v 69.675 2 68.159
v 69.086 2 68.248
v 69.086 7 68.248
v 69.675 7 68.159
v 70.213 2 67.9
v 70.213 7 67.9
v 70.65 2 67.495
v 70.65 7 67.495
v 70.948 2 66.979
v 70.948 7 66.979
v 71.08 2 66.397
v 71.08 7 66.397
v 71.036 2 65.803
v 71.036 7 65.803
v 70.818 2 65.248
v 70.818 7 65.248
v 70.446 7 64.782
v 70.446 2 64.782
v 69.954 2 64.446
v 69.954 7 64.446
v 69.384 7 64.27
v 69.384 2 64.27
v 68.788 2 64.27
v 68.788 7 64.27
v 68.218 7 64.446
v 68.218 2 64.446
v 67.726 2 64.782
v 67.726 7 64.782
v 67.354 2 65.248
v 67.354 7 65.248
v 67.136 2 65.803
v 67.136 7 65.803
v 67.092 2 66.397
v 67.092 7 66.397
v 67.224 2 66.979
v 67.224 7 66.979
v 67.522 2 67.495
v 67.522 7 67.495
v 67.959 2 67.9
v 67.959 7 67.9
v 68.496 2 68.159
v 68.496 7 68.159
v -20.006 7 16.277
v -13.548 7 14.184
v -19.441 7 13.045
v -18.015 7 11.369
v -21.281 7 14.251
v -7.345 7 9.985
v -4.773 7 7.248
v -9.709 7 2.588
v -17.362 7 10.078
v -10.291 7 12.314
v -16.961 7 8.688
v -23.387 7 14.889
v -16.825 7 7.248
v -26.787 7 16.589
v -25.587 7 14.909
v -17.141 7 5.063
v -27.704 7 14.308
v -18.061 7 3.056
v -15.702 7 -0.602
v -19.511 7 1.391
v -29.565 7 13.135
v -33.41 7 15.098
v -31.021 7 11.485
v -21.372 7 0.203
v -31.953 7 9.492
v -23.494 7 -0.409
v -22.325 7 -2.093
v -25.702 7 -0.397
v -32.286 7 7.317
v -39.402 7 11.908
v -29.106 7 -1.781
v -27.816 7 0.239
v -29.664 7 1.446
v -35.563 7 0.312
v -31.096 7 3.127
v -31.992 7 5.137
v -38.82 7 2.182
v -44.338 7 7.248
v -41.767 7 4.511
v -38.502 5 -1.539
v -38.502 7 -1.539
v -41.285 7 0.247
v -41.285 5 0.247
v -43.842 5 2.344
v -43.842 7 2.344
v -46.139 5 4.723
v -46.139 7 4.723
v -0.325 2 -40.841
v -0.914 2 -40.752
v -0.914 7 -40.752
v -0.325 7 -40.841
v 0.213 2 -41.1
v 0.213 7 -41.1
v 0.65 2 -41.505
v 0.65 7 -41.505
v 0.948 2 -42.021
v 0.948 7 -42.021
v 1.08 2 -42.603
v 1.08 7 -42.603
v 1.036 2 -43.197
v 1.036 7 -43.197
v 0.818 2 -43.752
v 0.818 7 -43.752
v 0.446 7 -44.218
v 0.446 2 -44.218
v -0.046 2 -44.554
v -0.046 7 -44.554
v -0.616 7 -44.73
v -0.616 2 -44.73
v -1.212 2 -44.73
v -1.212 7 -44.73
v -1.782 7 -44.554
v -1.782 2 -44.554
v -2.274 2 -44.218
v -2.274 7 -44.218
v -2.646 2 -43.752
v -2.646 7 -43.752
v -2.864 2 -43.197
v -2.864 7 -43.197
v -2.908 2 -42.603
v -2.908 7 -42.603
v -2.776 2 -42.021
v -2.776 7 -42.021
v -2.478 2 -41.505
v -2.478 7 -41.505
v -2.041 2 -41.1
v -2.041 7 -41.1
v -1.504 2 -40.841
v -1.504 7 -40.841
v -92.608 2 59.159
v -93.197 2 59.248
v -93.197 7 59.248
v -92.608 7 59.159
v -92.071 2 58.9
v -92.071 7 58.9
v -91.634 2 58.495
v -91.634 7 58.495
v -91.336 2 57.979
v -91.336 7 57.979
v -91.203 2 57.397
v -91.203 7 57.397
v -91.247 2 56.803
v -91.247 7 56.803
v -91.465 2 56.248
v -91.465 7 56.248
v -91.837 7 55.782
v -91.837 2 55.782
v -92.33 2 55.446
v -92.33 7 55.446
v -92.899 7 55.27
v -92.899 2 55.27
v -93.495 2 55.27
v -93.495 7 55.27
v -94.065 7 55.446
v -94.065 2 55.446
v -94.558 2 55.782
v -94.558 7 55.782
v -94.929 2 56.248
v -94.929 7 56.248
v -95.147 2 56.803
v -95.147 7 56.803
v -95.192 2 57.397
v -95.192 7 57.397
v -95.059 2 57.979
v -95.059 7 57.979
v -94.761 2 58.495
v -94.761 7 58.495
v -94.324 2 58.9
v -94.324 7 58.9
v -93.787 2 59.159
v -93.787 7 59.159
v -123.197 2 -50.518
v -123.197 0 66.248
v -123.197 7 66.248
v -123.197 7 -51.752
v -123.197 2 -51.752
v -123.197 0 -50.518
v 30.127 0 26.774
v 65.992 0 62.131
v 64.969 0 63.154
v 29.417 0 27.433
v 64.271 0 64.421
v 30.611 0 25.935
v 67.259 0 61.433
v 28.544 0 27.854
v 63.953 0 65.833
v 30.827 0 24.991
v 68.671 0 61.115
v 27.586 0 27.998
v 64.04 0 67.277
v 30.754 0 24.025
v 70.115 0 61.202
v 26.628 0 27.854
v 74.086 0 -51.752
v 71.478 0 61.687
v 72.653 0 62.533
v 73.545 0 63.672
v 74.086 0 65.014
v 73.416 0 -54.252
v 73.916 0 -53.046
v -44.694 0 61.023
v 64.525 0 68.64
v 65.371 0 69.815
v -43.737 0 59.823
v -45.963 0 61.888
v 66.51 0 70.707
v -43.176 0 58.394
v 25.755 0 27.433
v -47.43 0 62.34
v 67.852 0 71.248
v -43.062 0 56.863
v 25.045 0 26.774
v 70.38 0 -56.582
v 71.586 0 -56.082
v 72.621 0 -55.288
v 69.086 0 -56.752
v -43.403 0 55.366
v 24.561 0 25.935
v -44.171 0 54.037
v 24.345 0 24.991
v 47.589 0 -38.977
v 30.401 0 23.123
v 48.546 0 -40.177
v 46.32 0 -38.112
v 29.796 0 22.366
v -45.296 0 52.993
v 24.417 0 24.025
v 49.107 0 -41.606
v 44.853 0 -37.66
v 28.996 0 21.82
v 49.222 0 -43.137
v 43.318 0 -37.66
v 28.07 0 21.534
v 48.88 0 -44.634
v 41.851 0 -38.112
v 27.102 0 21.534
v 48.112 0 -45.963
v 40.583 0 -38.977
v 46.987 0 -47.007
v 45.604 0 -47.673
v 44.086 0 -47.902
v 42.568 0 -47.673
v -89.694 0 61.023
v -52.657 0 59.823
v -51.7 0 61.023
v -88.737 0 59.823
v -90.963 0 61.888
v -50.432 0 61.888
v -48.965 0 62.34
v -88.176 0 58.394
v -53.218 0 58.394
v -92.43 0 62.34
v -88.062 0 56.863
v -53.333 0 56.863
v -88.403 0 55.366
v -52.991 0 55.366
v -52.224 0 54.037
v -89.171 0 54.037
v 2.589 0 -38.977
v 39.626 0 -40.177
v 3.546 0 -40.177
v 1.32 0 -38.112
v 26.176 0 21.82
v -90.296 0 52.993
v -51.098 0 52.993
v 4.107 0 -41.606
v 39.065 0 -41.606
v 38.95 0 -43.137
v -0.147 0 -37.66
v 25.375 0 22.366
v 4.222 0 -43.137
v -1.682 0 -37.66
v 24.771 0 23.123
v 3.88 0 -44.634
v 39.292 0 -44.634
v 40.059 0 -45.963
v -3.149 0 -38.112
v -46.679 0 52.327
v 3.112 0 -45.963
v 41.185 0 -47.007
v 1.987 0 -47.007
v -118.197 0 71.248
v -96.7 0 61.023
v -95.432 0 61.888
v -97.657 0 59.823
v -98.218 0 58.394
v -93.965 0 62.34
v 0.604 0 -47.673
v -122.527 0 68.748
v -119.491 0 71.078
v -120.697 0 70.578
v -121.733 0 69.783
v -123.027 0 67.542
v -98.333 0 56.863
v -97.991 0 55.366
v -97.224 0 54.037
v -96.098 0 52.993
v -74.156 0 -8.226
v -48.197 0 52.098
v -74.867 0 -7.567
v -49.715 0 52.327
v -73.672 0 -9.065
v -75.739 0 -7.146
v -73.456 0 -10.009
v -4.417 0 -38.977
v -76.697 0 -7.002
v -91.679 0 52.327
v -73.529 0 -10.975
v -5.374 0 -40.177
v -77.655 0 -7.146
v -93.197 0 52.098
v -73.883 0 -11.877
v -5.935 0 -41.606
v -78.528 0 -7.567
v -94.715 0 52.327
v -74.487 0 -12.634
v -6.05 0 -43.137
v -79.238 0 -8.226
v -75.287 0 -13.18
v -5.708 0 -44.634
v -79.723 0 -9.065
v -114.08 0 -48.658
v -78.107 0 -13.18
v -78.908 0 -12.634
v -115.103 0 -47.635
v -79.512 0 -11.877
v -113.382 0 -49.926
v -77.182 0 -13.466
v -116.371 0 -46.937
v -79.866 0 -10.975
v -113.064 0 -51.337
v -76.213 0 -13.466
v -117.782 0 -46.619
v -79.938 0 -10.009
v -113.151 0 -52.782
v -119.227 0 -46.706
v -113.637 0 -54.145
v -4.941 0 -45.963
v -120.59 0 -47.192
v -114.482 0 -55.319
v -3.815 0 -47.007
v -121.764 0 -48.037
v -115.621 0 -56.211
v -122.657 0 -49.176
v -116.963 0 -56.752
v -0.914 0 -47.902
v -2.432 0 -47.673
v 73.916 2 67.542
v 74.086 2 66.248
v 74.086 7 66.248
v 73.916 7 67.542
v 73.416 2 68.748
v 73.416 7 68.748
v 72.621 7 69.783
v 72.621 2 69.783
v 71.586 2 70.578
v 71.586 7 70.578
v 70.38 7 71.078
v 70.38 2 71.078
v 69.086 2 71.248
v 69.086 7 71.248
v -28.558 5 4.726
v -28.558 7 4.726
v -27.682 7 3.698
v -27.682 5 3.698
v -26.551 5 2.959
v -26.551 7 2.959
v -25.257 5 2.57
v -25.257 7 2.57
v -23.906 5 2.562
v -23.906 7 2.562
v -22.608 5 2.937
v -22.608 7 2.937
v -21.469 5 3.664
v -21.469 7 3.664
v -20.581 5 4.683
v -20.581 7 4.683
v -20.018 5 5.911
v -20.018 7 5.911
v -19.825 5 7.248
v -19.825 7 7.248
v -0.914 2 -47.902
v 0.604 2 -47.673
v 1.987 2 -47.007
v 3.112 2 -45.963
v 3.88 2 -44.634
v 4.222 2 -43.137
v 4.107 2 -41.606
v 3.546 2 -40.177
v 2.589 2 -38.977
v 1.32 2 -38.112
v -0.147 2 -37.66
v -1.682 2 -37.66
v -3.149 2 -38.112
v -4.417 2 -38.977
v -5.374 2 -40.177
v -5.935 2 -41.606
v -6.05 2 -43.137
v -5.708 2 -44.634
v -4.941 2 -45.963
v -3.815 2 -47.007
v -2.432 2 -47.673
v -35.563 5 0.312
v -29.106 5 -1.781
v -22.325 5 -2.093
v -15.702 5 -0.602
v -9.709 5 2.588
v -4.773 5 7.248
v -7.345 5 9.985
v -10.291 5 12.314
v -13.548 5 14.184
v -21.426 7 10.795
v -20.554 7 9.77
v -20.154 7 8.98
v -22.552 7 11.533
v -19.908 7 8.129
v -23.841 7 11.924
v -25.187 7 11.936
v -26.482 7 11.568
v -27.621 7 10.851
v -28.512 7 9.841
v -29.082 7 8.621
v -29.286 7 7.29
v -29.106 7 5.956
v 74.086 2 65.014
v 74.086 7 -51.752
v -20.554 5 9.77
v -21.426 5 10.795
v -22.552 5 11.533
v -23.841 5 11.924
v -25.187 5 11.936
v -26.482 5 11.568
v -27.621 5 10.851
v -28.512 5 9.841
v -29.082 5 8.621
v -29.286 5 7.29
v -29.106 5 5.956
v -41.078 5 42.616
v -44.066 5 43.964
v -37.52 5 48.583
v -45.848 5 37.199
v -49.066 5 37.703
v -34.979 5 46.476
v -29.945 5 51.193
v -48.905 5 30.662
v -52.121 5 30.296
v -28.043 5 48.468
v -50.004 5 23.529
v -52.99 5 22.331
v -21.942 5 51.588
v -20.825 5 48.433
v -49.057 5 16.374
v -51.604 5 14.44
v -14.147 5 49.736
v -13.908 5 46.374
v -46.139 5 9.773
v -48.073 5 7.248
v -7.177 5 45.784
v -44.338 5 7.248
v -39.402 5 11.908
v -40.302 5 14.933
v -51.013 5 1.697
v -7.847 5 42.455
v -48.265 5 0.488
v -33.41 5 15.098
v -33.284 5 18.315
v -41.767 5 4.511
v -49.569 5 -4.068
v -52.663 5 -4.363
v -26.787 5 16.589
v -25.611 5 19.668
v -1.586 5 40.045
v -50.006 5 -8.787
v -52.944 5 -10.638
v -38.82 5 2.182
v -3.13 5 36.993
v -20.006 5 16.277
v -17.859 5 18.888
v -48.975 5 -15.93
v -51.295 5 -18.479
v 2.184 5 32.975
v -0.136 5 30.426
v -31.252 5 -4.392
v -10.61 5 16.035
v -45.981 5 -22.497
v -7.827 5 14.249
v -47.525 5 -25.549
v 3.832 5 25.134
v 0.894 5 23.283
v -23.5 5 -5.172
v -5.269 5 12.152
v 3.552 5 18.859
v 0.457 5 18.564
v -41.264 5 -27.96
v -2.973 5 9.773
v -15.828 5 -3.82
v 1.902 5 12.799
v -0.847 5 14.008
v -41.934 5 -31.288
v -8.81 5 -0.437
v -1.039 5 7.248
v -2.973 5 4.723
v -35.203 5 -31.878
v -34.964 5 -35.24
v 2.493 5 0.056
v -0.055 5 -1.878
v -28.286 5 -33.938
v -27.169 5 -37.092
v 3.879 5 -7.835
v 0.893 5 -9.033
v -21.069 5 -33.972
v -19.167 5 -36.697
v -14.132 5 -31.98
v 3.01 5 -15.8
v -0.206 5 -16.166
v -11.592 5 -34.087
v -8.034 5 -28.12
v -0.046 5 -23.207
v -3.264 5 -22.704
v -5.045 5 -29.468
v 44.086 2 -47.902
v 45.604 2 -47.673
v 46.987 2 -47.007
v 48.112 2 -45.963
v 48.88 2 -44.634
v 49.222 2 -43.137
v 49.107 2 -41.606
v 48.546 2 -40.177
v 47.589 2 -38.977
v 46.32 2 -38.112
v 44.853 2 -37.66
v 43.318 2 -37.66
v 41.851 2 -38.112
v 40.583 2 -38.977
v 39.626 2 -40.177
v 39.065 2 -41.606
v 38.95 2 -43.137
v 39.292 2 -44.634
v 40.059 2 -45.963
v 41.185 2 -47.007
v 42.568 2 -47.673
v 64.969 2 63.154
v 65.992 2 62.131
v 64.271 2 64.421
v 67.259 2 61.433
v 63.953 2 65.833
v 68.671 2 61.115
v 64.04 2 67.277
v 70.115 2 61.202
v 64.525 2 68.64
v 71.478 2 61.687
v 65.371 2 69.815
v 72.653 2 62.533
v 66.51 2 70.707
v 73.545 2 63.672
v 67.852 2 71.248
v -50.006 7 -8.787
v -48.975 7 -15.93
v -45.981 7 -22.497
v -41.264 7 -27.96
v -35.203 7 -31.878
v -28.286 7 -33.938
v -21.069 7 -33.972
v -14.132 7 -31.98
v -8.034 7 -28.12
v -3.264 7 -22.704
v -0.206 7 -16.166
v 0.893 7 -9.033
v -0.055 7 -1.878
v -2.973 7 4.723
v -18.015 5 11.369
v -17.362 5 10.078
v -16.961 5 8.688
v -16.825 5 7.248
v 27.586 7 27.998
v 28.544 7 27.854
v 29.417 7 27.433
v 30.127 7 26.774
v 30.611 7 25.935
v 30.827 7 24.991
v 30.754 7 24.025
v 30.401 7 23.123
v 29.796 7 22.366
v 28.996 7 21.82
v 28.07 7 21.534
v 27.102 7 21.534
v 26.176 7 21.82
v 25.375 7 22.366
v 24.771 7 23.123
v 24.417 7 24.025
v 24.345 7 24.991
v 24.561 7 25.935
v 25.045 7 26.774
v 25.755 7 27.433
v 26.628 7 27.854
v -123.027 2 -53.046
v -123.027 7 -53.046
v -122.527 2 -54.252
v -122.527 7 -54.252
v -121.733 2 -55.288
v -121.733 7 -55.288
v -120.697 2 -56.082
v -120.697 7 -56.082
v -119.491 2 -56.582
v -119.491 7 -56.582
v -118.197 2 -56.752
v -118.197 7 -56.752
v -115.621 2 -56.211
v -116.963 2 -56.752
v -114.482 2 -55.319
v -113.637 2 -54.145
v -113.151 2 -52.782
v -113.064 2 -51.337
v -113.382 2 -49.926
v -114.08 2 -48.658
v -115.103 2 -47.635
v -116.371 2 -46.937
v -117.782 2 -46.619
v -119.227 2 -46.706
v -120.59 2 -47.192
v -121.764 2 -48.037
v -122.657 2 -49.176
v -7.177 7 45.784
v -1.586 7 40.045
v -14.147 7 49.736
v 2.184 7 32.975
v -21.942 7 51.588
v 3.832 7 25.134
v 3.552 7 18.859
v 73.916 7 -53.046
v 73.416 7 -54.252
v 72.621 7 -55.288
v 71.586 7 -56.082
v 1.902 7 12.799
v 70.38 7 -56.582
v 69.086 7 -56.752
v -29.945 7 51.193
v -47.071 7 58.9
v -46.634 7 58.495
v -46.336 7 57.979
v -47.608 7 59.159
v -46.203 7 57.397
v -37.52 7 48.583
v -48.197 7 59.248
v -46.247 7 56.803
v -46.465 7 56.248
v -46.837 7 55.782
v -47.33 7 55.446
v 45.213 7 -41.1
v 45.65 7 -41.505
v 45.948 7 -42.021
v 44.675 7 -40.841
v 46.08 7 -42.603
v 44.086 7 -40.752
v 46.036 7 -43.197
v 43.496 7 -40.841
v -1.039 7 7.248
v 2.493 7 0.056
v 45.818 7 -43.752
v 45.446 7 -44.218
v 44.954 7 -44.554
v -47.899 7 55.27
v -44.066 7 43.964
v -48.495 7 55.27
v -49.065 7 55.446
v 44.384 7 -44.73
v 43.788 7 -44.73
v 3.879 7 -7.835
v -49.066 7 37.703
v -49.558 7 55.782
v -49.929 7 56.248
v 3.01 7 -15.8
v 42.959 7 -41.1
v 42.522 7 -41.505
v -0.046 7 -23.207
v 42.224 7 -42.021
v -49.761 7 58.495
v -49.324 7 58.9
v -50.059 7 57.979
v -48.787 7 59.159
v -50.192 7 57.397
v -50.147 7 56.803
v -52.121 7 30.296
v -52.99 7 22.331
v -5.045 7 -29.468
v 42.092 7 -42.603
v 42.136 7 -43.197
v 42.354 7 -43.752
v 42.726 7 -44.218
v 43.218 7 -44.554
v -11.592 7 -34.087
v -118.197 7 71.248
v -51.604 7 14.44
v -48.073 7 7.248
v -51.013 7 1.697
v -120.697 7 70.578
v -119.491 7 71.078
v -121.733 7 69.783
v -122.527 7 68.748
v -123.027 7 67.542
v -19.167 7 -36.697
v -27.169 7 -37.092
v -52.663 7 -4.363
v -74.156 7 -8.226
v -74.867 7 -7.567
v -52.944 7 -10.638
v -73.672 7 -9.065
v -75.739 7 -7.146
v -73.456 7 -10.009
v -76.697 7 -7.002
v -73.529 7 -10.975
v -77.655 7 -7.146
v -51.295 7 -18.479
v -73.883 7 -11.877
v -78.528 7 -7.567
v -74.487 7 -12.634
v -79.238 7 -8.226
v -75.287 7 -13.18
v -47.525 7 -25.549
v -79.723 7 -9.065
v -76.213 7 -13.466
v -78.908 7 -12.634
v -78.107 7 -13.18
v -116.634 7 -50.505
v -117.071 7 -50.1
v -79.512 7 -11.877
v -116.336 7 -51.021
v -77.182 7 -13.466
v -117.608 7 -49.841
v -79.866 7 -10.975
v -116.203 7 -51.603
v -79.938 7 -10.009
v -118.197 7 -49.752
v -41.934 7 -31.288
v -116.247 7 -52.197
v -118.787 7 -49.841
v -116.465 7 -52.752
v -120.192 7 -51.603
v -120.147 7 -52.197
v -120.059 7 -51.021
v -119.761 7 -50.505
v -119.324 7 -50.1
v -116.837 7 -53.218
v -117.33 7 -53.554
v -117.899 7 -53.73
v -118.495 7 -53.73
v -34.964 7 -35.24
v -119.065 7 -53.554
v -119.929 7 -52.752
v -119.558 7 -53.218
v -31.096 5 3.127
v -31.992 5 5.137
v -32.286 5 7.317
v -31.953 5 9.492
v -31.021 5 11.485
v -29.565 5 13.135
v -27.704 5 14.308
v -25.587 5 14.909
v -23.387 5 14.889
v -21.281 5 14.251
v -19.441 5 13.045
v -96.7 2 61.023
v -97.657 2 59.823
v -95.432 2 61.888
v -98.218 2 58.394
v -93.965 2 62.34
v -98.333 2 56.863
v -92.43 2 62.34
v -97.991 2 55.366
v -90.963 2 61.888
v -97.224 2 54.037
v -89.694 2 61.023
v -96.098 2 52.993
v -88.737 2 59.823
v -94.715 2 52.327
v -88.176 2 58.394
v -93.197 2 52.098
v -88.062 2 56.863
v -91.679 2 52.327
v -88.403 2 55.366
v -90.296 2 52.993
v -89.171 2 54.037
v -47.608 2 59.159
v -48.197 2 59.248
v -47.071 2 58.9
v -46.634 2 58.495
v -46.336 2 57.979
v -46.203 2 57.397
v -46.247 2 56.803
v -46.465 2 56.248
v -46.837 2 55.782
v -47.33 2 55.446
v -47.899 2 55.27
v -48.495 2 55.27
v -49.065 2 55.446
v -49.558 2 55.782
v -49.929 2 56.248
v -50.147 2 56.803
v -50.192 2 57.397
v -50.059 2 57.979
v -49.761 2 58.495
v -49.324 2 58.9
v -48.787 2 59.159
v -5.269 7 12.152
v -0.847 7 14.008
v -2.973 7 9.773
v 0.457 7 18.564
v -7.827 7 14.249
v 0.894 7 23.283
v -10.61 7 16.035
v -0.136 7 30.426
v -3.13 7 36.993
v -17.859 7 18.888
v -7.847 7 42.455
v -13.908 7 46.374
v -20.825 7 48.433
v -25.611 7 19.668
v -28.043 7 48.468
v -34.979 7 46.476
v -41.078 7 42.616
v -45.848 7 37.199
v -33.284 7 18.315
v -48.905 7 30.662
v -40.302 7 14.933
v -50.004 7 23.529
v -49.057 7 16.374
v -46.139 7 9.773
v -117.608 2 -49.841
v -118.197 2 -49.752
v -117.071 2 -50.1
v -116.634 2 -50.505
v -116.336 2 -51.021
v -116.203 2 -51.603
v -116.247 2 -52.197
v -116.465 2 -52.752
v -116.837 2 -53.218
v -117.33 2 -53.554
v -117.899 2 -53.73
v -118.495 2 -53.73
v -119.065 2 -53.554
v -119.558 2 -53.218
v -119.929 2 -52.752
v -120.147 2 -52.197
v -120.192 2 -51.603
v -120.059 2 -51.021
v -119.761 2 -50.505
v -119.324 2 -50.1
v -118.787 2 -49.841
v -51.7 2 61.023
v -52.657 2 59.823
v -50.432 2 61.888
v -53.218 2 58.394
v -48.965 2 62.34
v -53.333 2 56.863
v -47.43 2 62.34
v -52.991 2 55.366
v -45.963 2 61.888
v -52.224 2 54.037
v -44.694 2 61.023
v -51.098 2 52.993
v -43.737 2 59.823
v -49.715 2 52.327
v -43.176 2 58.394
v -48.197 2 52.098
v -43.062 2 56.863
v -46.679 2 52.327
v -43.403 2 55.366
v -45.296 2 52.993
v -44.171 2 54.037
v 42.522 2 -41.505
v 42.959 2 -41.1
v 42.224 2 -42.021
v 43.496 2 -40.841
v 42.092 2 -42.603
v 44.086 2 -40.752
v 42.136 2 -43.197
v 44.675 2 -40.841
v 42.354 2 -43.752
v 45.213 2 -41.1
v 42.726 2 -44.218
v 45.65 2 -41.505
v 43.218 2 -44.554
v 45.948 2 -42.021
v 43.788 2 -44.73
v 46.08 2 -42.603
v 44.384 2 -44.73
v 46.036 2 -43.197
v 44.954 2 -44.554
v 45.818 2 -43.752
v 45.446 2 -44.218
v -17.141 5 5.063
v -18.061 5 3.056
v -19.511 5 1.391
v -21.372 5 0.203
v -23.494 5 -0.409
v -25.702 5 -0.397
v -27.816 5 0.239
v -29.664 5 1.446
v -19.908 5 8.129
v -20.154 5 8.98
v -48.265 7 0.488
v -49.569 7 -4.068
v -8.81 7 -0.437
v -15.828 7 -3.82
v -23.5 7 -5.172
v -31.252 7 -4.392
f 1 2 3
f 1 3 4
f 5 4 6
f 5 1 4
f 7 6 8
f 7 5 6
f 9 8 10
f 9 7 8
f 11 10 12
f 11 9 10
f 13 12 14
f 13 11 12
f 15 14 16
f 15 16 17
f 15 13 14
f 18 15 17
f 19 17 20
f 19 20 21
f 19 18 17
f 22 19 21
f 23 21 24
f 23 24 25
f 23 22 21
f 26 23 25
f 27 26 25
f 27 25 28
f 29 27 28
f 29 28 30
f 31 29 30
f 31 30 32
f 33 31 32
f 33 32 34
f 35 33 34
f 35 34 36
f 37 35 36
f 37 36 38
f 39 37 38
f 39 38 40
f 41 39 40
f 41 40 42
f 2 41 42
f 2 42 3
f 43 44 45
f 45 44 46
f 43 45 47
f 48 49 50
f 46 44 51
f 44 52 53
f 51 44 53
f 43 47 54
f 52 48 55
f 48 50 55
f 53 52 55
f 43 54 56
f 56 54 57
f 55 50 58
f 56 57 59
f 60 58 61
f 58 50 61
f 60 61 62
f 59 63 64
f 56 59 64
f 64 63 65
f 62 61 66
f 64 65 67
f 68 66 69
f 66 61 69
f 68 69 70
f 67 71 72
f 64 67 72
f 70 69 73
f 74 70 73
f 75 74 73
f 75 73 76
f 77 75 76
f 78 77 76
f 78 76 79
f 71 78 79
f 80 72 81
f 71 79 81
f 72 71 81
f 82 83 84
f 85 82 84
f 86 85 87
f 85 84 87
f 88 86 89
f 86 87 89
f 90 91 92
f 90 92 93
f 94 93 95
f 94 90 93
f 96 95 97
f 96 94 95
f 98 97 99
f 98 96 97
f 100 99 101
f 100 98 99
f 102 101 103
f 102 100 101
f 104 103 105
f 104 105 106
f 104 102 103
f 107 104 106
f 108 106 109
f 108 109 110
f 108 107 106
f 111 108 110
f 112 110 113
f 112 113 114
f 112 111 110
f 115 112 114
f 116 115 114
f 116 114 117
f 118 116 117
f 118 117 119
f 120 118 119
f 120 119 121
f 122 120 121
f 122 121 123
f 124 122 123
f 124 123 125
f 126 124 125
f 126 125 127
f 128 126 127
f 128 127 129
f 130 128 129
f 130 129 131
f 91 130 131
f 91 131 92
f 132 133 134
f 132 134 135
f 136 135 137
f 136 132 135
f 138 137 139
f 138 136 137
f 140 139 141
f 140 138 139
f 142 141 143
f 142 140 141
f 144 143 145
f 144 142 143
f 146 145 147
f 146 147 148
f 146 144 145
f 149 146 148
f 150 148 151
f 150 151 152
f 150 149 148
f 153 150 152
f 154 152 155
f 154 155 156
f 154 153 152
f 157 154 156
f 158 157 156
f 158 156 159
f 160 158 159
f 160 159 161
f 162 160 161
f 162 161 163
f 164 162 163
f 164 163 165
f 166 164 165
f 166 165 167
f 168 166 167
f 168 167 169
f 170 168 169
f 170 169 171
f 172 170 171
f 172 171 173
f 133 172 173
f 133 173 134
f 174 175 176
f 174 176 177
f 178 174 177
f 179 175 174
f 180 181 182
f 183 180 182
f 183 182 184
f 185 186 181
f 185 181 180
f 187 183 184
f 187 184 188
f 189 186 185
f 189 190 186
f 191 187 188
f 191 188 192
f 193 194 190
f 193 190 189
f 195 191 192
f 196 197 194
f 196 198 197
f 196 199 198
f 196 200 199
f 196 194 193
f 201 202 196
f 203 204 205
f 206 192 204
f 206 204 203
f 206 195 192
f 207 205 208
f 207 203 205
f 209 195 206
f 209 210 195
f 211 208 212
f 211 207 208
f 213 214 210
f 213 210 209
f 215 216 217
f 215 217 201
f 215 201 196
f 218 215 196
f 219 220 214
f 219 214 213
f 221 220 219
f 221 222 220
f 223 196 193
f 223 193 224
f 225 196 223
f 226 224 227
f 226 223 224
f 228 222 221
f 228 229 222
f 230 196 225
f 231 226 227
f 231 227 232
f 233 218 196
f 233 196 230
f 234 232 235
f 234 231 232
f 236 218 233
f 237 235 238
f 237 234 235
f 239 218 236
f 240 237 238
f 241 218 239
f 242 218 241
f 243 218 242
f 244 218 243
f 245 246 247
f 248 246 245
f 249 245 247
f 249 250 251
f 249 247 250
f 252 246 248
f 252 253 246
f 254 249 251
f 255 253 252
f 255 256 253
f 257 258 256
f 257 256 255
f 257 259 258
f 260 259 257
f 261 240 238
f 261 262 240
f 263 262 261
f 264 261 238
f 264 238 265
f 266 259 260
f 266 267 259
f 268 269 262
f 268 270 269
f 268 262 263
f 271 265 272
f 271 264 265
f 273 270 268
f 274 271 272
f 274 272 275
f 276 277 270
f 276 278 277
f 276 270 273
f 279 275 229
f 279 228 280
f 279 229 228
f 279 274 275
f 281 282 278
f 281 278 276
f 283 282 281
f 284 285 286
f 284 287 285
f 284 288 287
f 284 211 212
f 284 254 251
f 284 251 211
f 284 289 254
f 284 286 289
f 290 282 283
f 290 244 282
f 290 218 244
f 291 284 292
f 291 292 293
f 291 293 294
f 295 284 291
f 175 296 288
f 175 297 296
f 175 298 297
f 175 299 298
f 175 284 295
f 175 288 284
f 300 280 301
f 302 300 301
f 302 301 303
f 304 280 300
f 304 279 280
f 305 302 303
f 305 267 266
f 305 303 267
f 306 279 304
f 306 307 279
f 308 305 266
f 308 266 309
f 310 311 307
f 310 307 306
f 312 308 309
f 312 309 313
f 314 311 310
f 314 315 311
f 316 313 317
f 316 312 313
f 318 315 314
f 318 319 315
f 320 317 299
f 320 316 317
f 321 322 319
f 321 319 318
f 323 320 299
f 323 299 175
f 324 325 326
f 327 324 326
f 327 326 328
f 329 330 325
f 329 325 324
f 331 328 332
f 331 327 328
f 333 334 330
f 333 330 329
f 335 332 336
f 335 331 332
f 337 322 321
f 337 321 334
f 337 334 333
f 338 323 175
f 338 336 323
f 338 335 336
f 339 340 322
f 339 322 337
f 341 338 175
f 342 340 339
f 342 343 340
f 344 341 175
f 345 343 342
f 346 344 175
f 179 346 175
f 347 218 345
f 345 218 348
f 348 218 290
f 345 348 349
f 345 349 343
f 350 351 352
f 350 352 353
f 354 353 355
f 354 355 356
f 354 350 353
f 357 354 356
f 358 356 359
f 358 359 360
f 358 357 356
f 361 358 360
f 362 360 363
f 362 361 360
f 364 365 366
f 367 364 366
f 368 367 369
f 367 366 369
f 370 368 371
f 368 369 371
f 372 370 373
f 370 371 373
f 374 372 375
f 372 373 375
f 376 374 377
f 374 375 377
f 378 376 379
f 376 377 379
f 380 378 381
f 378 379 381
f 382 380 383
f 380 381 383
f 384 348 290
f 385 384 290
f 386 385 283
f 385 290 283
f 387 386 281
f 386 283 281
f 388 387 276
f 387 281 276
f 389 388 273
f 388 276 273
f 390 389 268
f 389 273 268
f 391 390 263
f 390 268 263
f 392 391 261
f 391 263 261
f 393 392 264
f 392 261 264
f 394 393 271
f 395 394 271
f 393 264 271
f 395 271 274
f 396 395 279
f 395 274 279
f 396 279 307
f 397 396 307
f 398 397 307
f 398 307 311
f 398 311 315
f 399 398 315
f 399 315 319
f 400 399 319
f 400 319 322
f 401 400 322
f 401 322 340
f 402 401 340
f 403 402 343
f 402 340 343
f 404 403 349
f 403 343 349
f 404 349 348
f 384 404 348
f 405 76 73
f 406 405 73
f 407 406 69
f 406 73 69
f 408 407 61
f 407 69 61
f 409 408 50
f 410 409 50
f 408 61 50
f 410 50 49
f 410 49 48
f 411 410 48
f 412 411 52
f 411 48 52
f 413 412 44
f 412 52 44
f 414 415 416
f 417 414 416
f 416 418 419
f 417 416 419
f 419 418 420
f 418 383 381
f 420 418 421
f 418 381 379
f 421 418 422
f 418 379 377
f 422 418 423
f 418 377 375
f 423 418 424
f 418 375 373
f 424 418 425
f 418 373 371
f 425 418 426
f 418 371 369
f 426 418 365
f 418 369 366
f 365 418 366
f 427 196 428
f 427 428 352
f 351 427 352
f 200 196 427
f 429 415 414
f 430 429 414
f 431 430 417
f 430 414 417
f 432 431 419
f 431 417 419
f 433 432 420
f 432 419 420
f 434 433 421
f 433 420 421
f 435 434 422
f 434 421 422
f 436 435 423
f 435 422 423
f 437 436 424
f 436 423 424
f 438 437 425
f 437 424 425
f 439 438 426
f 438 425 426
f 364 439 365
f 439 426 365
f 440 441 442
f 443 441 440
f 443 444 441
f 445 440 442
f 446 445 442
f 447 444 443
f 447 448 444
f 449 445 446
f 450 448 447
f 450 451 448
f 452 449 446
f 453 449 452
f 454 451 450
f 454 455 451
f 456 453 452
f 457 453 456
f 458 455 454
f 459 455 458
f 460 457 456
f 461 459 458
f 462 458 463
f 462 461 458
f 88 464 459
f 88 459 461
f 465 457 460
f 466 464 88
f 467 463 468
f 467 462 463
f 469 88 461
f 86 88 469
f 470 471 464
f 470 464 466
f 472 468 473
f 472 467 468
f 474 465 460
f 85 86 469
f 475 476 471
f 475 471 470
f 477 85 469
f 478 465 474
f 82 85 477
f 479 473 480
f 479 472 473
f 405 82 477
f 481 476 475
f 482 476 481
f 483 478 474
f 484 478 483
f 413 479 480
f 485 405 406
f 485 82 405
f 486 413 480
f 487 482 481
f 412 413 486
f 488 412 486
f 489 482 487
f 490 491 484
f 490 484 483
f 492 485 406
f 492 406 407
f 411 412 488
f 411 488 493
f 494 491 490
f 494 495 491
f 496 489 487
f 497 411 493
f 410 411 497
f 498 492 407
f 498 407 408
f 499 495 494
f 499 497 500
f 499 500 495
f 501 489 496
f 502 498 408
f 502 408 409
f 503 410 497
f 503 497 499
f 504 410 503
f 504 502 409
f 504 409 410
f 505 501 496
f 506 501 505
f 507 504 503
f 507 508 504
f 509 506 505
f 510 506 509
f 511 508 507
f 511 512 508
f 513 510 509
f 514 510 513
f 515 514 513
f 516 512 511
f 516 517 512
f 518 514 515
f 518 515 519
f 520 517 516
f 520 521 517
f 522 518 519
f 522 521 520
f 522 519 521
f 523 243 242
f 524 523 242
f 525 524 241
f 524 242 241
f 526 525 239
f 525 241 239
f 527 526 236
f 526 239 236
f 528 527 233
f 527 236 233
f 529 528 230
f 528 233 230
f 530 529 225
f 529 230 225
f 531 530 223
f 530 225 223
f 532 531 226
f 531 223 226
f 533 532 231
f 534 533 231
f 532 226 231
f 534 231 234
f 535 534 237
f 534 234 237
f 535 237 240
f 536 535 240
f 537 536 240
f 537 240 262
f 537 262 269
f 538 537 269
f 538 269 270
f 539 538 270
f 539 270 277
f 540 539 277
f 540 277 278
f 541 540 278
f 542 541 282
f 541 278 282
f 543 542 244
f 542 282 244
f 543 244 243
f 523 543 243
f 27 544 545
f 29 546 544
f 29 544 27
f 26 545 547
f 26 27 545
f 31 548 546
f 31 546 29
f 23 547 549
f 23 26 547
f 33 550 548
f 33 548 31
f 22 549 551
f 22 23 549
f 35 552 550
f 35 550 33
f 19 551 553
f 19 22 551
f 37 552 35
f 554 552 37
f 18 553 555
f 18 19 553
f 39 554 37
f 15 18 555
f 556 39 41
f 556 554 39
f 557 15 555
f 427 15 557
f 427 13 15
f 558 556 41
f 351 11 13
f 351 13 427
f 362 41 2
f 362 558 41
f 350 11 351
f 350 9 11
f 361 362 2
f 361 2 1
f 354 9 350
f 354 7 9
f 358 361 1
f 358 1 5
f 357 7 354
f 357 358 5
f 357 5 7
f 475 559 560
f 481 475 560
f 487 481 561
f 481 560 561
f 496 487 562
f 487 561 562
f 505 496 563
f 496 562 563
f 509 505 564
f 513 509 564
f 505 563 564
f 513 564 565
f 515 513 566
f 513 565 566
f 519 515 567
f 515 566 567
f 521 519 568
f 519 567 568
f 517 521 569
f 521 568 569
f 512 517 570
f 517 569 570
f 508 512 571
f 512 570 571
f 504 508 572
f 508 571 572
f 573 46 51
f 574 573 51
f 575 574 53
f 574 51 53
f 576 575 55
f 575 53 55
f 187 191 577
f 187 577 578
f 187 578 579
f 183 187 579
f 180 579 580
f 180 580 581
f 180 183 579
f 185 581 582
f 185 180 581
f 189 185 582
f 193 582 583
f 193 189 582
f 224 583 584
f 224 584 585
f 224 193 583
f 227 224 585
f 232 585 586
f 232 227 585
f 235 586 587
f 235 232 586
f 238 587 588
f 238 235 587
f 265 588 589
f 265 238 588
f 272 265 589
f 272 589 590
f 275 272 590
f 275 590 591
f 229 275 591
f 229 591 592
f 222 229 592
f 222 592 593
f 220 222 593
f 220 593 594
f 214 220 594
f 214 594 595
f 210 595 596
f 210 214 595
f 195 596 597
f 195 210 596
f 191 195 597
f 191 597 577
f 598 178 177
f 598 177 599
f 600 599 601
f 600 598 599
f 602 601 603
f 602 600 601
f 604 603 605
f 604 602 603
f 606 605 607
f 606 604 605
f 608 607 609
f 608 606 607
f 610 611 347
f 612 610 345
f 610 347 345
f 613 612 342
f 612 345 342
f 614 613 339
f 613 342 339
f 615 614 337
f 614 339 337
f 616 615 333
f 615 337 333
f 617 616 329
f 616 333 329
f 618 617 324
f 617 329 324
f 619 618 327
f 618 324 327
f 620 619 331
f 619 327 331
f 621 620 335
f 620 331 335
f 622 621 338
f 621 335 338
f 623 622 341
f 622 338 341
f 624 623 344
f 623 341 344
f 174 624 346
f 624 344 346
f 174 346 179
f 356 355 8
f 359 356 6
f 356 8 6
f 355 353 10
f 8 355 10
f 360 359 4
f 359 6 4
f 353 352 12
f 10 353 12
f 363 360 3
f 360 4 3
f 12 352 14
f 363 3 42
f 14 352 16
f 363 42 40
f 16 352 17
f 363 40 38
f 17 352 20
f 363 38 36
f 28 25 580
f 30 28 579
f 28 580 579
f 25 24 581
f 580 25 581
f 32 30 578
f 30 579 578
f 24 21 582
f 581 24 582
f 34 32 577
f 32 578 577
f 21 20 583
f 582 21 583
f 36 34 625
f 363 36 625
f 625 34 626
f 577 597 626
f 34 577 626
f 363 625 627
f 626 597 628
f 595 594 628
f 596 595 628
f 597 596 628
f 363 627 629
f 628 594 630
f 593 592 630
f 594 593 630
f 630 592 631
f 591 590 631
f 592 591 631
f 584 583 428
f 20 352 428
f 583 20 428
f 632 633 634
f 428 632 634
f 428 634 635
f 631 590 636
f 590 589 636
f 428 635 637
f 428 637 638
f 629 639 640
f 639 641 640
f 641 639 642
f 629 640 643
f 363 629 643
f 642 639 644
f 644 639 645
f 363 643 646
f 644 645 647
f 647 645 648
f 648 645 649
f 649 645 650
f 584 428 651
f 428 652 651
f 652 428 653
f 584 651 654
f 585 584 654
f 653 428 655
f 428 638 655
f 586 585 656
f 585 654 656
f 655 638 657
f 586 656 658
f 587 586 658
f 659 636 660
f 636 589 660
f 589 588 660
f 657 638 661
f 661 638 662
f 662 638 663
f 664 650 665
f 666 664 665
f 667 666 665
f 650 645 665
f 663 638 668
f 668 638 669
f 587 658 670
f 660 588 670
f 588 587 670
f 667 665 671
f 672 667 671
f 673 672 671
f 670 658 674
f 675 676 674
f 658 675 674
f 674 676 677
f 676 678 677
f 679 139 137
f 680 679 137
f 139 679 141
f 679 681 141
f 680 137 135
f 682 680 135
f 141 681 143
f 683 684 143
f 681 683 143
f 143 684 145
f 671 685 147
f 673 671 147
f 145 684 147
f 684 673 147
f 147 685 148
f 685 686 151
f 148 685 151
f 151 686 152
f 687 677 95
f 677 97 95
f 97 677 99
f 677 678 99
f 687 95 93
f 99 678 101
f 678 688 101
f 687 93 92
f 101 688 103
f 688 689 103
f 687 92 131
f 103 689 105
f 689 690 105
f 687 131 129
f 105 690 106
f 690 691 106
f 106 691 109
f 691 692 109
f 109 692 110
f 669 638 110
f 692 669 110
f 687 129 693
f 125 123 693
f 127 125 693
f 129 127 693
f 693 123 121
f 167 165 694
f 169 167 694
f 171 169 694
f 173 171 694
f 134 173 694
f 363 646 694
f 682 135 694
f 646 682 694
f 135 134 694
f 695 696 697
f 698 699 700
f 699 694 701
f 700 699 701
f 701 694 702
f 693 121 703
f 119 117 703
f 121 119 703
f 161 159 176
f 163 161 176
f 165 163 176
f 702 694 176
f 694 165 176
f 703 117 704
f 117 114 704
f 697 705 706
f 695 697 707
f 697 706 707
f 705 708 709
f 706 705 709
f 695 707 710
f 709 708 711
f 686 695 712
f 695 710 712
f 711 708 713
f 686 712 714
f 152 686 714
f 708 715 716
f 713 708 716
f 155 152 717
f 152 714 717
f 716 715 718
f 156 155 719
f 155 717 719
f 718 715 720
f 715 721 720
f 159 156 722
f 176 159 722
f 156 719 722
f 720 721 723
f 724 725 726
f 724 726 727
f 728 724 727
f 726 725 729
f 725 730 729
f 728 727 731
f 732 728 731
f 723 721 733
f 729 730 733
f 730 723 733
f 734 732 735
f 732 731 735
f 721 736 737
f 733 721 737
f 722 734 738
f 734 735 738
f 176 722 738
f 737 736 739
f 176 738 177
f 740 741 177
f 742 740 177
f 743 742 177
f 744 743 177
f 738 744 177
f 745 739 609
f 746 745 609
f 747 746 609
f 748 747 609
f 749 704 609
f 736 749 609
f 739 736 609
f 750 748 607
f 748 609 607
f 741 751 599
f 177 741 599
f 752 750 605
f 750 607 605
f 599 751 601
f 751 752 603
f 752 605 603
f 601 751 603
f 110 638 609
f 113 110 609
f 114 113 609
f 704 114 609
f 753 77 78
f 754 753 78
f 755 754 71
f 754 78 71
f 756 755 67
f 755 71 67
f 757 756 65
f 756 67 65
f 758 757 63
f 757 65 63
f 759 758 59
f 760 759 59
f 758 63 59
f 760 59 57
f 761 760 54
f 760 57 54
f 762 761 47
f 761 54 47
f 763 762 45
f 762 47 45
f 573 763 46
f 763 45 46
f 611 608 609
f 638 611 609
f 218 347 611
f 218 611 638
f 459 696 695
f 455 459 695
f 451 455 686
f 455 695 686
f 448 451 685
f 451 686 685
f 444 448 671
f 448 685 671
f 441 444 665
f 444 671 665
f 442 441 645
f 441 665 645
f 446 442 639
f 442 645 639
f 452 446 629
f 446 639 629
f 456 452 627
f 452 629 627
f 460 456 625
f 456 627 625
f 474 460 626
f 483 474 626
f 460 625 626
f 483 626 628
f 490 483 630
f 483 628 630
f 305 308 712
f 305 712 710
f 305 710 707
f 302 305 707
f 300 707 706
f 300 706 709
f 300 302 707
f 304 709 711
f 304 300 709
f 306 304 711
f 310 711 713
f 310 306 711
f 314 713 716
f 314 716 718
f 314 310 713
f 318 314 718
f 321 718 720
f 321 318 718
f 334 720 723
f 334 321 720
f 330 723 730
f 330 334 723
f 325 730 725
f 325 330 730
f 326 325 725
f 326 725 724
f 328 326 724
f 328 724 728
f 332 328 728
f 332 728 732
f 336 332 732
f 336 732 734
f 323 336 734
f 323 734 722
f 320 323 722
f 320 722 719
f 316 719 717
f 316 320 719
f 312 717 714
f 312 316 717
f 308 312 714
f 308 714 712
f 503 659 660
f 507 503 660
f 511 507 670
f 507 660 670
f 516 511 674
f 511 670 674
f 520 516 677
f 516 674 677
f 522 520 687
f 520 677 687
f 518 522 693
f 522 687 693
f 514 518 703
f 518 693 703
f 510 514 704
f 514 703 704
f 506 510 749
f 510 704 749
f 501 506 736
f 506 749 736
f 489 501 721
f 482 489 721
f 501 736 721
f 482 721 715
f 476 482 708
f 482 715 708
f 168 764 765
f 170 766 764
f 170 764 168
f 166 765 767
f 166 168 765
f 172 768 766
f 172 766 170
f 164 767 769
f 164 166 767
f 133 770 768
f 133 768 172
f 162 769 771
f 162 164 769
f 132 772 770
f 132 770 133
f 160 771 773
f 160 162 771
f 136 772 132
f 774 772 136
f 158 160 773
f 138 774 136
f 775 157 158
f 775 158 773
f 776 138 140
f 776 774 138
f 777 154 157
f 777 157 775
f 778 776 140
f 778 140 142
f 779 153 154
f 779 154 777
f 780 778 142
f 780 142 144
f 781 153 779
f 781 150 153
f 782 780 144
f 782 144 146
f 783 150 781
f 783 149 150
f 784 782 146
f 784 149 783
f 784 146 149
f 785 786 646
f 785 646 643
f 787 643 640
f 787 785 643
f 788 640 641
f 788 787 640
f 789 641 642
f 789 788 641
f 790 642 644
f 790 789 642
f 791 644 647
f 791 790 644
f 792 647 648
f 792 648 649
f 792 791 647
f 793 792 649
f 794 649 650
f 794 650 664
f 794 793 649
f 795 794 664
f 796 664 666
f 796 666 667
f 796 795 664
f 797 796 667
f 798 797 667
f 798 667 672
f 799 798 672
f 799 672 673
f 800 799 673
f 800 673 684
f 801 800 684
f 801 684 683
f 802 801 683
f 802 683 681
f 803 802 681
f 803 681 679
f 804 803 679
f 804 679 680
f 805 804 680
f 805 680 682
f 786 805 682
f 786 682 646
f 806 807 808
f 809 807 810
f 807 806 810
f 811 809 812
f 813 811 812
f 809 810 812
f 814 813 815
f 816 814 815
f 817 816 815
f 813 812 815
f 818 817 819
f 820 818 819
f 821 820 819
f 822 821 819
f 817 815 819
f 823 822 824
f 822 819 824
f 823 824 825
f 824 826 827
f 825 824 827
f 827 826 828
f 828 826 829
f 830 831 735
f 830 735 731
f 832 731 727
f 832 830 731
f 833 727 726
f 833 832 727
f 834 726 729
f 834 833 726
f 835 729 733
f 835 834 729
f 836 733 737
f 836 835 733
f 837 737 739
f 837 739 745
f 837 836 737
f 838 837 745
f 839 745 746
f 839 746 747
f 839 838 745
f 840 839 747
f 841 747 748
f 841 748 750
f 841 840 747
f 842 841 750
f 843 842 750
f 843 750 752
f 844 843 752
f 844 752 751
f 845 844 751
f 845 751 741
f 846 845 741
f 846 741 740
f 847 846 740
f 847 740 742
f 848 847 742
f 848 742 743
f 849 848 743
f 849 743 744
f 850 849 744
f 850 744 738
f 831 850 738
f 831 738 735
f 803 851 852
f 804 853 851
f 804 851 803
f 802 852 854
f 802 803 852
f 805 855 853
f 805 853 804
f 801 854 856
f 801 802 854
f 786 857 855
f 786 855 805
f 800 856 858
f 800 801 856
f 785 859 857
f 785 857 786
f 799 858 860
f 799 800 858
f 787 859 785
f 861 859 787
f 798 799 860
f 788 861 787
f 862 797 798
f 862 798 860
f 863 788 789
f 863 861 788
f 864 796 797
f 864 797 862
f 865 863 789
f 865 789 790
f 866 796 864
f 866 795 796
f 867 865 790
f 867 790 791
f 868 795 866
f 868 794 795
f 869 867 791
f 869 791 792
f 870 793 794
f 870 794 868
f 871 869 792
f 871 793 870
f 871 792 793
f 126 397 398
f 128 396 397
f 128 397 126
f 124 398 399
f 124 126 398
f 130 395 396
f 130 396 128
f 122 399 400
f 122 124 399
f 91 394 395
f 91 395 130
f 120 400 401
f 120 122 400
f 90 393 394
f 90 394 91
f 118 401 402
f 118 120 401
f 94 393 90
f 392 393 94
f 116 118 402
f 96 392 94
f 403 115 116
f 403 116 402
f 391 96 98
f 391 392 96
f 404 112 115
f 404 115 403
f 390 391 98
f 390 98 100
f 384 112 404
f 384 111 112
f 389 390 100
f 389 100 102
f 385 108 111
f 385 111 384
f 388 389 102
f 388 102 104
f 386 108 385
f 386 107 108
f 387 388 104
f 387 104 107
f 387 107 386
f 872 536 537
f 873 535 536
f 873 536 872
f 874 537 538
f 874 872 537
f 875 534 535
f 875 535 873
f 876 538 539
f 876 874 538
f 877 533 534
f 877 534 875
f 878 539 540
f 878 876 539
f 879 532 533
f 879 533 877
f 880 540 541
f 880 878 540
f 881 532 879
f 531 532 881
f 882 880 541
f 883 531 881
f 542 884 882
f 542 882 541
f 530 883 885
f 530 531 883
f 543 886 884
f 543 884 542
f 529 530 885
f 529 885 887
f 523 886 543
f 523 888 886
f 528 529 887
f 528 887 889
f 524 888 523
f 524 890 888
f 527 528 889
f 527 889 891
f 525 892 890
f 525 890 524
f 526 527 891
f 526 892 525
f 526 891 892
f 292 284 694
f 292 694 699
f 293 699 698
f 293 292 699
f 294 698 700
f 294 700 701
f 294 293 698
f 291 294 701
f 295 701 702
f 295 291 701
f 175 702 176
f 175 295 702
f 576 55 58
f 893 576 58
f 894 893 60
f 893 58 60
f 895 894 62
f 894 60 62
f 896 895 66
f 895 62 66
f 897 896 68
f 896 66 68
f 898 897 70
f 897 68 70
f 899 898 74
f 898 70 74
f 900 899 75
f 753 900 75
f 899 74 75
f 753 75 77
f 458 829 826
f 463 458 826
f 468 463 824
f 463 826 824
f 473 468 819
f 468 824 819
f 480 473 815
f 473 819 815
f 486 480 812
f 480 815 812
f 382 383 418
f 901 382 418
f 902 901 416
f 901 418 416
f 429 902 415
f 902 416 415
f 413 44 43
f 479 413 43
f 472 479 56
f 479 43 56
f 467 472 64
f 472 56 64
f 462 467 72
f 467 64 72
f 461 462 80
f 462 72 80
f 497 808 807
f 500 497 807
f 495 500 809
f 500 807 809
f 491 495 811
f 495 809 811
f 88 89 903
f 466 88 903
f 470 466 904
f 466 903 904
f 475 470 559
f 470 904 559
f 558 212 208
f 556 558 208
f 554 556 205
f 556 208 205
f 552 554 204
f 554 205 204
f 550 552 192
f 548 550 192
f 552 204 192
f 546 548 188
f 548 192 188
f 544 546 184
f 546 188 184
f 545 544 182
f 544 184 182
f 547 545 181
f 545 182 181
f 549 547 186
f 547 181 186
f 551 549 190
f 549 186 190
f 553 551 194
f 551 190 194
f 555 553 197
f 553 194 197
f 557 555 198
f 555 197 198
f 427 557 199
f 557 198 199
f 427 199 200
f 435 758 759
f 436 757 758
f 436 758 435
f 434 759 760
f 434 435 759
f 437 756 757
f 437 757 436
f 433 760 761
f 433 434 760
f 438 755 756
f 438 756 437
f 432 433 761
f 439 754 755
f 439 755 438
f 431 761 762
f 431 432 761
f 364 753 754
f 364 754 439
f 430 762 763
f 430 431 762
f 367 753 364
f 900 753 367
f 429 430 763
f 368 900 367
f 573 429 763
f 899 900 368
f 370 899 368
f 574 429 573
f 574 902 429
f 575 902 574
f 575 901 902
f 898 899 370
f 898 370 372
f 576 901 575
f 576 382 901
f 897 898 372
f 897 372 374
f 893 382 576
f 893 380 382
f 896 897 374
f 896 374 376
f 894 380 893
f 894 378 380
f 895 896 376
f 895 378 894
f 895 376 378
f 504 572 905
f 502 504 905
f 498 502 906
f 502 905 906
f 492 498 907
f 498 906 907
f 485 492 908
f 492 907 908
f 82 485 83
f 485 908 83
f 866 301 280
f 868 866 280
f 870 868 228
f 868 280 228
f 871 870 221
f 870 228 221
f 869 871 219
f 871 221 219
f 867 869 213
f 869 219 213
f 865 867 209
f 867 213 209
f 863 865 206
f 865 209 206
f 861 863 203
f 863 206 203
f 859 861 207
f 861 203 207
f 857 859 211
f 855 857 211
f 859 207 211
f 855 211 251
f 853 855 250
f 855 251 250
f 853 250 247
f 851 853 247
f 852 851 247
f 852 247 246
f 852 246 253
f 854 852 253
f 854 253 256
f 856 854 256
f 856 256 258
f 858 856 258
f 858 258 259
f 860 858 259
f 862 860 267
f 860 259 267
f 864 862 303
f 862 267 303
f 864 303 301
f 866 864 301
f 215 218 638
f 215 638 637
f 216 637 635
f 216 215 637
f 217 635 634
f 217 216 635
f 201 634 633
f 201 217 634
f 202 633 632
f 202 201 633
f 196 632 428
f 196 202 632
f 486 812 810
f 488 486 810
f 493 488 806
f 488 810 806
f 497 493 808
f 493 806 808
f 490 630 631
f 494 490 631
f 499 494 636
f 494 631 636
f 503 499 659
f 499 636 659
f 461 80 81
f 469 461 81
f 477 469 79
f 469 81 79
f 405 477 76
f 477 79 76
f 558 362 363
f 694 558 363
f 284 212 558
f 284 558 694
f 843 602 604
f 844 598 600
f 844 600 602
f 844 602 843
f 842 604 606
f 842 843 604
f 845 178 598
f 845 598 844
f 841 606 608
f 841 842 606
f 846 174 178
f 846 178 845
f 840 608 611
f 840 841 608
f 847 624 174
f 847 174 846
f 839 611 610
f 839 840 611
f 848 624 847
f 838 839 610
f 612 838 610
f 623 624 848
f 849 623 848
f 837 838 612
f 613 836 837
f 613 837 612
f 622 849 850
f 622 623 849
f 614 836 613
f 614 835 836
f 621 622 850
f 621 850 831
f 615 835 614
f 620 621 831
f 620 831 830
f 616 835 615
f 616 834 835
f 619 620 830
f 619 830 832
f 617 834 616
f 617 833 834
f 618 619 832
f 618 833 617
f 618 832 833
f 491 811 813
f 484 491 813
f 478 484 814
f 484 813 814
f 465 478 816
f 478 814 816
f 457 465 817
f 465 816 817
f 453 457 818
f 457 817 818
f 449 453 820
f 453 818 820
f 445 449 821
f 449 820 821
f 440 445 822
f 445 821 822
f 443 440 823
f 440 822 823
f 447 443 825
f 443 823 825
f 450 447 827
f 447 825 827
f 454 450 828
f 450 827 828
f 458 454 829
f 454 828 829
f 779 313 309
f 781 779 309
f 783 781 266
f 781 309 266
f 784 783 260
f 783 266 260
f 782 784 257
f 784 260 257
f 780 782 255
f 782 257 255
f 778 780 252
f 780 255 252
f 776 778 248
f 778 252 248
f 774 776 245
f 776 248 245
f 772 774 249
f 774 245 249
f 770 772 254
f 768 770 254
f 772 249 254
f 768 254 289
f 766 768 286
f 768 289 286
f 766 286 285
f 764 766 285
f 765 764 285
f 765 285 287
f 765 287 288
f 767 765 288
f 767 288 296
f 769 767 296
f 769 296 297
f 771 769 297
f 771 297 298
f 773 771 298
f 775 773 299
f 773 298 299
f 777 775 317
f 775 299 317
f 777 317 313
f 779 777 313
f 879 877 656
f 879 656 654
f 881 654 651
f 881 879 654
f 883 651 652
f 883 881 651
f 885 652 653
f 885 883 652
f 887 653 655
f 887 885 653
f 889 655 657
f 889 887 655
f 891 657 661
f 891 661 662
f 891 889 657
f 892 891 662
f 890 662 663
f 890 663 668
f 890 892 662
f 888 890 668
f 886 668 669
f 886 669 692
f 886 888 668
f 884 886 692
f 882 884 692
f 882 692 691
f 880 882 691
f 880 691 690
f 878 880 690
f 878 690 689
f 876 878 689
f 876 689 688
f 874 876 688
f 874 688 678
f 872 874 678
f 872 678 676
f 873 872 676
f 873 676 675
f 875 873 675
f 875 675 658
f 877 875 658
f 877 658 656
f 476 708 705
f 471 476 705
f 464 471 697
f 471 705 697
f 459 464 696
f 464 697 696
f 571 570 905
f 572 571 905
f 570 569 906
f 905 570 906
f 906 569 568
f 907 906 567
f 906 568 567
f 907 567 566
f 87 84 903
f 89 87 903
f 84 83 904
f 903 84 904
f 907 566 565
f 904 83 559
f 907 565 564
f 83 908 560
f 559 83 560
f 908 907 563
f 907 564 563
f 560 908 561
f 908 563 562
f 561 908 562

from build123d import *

# Parameters (mm, degrees)
SKETCH1_R           = 2
SKETCH1_R_2         = 3.25
BOSS_EXTRUDE1_DEPTH = 7
SKETCH2_R           = 5.15
CUT_EXTRUDE1_DEPTH  = 2
CUT_EXTRUDE3_DEPTH  = 2


with BuildPart() as part:
    # Sketch1 → Boss-Extrude1 (new body)
    with BuildSketch(Plane(origin=(0, 0, 0), x_dir=(1, 0, 0), z_dir=(0, 1, 0))):
        with BuildLine():
            Line((-118.197336116, 56.752063188), (69.085931957, 56.752063188))
            ThreePointArc((69.085931957, 56.752063188), (72.621465863, 55.287597094), (74.085931957, 51.752063188))
            Line((74.085931957, 51.752063188), (74.085931957, -66.247936812))
            ThreePointArc((74.085931957, -66.247936812), (72.621465863, -69.783470718), (69.085931957, -71.247936812))
            Line((69.085931957, -71.247936812), (-118.197336116, -71.247936812))
            ThreePointArc((-118.197336116, -71.247936812), (-121.732870022, -69.783470718), (-123.197336116, -66.247936812))
            Line((-123.197336116, -66.247936812), (-123.197336116, 51.752063188))
            ThreePointArc((-123.197336116, 51.752063188), (-121.732870022, 55.287597094), (-118.197336116, 56.752063188))
        make_face()
        with Locations(Location((-118.197336116, 51.752063188, 0), (0, 0, 270))):
            Circle(SKETCH1_R, mode=Mode.SUBTRACT)
        with Locations(Location((69.085931957, -66.247936812, 0), (0, 0, 270))):
            Circle(SKETCH1_R, mode=Mode.SUBTRACT)
        with Locations(Location((44.085931957, 42.752063188, 0), (0, 0, 270))):
            Circle(SKETCH1_R, mode=Mode.SUBTRACT)
        with Locations(Location((-0.914068043, 42.752063188, 0), (0, 0, 270))):
            Circle(SKETCH1_R, mode=Mode.SUBTRACT)
        with Locations(Location((-93.197336116, -57.247936812, 0), (0, 0, 270))):
            Circle(SKETCH1_R, mode=Mode.SUBTRACT)
        with Locations(Location((-48.197336116, -57.247936812, 0), (0, 0, 270))):
            Circle(SKETCH1_R, mode=Mode.SUBTRACT)
        with Locations(Location((-76.697336116, 10.252063188, 0), (0, 0, 270))):
            Circle(SKETCH1_R_2, mode=Mode.SUBTRACT)
        with Locations(Location((27.585931957, -24.747936812, 0), (0, 0, 270))):
            Circle(SKETCH1_R_2, mode=Mode.SUBTRACT)
    extrude(amount=BOSS_EXTRUDE1_DEPTH)

    # Sketch2 → Cut-Extrude1 (cut)
    with BuildSketch(Plane.XZ):
        with Locations((-118.197336116, -51.752063188)):
            Circle(SKETCH2_R)
        with Locations(Location((-0.914068043, -42.752063188, 0), (0, 0, 270))):
            Circle(SKETCH2_R)
        with Locations(Location((44.085931957, -42.752063188, 0), (0, 0, 270))):
            Circle(SKETCH2_R)
        with Locations((69.085931957, 66.247936812)):
            Circle(SKETCH2_R)
        with Locations(Location((-48.197336116, 57.247936812, 0), (0, 0, 270))):
            Circle(SKETCH2_R)
        with Locations(Location((-93.197336116, 57.247936812, 0), (0, 0, 270))):
            Circle(SKETCH2_R)
    extrude(amount=-CUT_EXTRUDE1_DEPTH, mode=Mode.SUBTRACT)

    # Sketch4 → Cut-Extrude3 (cut)
    with BuildSketch(Plane(origin=(0, 7, 0), x_dir=(1, 0, 0), z_dir=(0, 1, 0))):
        with BuildLine():
            ThreePointArc((-16.825362278, -7.247936812), (-22.411093503, 0.178960757), (-31.096095238, -3.127086078))
            Line((-31.096095238, -3.127086078), (-28.557891229, -4.726311018))
            ThreePointArc((-28.557891229, -4.726311018), (-23.243375898, -2.703279), (-19.825362278, -7.247936812))
            ThreePointArc((-19.825362278, -7.247936812), (-20.011044267, -8.560262993), (-20.553512929, -9.769562607))
            Line((-20.553512929, -9.769562607), (-18.01530892, -11.368787546))
            ThreePointArc((-18.01530892, -11.368787546), (-17.12880451, -9.392545389), (-16.825362278, -7.247936812))
        make_face()
        with BuildLine():
            Line((-28.557891229, -4.726311018), (-31.096095238, -3.127086078))
            ThreePointArc((-31.096095238, -3.127086078), (-28.676552813, -13.788329971), (-18.01530892, -11.368787546))
            Line((-18.01530892, -11.368787546), (-20.553512929, -9.769562607))
            ThreePointArc((-20.553512929, -9.769562607), (-27.077327874, -11.250125962), (-28.557891229, -4.726311018))
        make_face()
        with BuildLine():
            ThreePointArc((-1.038546315, -7.247936812), (-15.286948513, 35.660240122), (-52.943648692, 10.638218929))
            Line((-52.943648692, 10.638218929), (-50.005532279, 8.78702453))
            ThreePointArc((-50.005532279, 8.78702453), (-17.529440865, 33.223292942), (-2.972559683, -4.723049934))
            ThreePointArc((-2.972559683, -4.723049934), (-19.617614772, 4.759547304), (-38.501589456, 1.538831635))
            Line((-38.501589456, 1.538831635), (-35.563473042, -0.312362764))
            ThreePointArc((-35.563473042, -0.312362764), (-18.963238247, 1.569321693), (-4.772942827, -7.247936812))
            ThreePointArc((-4.772942827, -7.247936812), (-8.774709253, -11.203752107), (-13.547931116, -14.18351086))
            Line((-13.547931116, -14.18351086), (-10.609814702, -16.034705259))
            ThreePointArc((-10.609814702, -16.034705259), (-6.517387874, -13.237701677), (-2.972559683, -9.77282369))
            ThreePointArc((-2.972559683, -9.77282369), (-0.088261351, -16.255690409), (0.89412812, -23.282898154))
            Line((0.89412812, -23.282898154), (3.832244534, -25.134092553))
            ThreePointArc((3.832244534, -25.134092553), (2.894499286, -15.78317183), (-1.038546315, -7.247936812))
        make_face()
        with BuildLine():
            Line((-50.005532279, 8.78702453), (-52.943648692, 10.638218929))
            ThreePointArc((-52.943648692, 10.638218929), (-52.005903444, 1.287298206), (-48.072857843, -7.247936812))
            ThreePointArc((-48.072857843, -7.247936812), (-33.824455645, -50.156113746), (3.832244534, -25.134092553))
            Line((3.832244534, -25.134092553), (0.89412812, -23.282898154))
            ThreePointArc((0.89412812, -23.282898154), (-31.581963293, -47.719166566), (-46.138844475, -9.77282369))
            ThreePointArc((-46.138844475, -9.77282369), (-29.493789386, -19.255420928), (-10.609814702, -16.034705259))
            Line((-10.609814702, -16.034705259), (-13.547931116, -14.18351086))
            ThreePointArc((-13.547931116, -14.18351086), (-30.148165911, -16.065195317), (-44.338461331, -7.247936812))
            ThreePointArc((-44.338461331, -7.247936812), (-40.336694905, -3.292121517), (-35.563473042, -0.312362764))
            Line((-35.563473042, -0.312362764), (-38.501589456, 1.538831635))
            ThreePointArc((-38.501589456, 1.538831635), (-42.594016284, -1.258171947), (-46.138844475, -4.723049934))
            ThreePointArc((-46.138844475, -4.723049934), (-49.023142808, 1.759816785), (-50.005532279, 8.78702453))
        make_face()
    extrude(amount=-CUT_EXTRUDE3_DEPTH, mode=Mode.SUBTRACT)


solid = part.part
